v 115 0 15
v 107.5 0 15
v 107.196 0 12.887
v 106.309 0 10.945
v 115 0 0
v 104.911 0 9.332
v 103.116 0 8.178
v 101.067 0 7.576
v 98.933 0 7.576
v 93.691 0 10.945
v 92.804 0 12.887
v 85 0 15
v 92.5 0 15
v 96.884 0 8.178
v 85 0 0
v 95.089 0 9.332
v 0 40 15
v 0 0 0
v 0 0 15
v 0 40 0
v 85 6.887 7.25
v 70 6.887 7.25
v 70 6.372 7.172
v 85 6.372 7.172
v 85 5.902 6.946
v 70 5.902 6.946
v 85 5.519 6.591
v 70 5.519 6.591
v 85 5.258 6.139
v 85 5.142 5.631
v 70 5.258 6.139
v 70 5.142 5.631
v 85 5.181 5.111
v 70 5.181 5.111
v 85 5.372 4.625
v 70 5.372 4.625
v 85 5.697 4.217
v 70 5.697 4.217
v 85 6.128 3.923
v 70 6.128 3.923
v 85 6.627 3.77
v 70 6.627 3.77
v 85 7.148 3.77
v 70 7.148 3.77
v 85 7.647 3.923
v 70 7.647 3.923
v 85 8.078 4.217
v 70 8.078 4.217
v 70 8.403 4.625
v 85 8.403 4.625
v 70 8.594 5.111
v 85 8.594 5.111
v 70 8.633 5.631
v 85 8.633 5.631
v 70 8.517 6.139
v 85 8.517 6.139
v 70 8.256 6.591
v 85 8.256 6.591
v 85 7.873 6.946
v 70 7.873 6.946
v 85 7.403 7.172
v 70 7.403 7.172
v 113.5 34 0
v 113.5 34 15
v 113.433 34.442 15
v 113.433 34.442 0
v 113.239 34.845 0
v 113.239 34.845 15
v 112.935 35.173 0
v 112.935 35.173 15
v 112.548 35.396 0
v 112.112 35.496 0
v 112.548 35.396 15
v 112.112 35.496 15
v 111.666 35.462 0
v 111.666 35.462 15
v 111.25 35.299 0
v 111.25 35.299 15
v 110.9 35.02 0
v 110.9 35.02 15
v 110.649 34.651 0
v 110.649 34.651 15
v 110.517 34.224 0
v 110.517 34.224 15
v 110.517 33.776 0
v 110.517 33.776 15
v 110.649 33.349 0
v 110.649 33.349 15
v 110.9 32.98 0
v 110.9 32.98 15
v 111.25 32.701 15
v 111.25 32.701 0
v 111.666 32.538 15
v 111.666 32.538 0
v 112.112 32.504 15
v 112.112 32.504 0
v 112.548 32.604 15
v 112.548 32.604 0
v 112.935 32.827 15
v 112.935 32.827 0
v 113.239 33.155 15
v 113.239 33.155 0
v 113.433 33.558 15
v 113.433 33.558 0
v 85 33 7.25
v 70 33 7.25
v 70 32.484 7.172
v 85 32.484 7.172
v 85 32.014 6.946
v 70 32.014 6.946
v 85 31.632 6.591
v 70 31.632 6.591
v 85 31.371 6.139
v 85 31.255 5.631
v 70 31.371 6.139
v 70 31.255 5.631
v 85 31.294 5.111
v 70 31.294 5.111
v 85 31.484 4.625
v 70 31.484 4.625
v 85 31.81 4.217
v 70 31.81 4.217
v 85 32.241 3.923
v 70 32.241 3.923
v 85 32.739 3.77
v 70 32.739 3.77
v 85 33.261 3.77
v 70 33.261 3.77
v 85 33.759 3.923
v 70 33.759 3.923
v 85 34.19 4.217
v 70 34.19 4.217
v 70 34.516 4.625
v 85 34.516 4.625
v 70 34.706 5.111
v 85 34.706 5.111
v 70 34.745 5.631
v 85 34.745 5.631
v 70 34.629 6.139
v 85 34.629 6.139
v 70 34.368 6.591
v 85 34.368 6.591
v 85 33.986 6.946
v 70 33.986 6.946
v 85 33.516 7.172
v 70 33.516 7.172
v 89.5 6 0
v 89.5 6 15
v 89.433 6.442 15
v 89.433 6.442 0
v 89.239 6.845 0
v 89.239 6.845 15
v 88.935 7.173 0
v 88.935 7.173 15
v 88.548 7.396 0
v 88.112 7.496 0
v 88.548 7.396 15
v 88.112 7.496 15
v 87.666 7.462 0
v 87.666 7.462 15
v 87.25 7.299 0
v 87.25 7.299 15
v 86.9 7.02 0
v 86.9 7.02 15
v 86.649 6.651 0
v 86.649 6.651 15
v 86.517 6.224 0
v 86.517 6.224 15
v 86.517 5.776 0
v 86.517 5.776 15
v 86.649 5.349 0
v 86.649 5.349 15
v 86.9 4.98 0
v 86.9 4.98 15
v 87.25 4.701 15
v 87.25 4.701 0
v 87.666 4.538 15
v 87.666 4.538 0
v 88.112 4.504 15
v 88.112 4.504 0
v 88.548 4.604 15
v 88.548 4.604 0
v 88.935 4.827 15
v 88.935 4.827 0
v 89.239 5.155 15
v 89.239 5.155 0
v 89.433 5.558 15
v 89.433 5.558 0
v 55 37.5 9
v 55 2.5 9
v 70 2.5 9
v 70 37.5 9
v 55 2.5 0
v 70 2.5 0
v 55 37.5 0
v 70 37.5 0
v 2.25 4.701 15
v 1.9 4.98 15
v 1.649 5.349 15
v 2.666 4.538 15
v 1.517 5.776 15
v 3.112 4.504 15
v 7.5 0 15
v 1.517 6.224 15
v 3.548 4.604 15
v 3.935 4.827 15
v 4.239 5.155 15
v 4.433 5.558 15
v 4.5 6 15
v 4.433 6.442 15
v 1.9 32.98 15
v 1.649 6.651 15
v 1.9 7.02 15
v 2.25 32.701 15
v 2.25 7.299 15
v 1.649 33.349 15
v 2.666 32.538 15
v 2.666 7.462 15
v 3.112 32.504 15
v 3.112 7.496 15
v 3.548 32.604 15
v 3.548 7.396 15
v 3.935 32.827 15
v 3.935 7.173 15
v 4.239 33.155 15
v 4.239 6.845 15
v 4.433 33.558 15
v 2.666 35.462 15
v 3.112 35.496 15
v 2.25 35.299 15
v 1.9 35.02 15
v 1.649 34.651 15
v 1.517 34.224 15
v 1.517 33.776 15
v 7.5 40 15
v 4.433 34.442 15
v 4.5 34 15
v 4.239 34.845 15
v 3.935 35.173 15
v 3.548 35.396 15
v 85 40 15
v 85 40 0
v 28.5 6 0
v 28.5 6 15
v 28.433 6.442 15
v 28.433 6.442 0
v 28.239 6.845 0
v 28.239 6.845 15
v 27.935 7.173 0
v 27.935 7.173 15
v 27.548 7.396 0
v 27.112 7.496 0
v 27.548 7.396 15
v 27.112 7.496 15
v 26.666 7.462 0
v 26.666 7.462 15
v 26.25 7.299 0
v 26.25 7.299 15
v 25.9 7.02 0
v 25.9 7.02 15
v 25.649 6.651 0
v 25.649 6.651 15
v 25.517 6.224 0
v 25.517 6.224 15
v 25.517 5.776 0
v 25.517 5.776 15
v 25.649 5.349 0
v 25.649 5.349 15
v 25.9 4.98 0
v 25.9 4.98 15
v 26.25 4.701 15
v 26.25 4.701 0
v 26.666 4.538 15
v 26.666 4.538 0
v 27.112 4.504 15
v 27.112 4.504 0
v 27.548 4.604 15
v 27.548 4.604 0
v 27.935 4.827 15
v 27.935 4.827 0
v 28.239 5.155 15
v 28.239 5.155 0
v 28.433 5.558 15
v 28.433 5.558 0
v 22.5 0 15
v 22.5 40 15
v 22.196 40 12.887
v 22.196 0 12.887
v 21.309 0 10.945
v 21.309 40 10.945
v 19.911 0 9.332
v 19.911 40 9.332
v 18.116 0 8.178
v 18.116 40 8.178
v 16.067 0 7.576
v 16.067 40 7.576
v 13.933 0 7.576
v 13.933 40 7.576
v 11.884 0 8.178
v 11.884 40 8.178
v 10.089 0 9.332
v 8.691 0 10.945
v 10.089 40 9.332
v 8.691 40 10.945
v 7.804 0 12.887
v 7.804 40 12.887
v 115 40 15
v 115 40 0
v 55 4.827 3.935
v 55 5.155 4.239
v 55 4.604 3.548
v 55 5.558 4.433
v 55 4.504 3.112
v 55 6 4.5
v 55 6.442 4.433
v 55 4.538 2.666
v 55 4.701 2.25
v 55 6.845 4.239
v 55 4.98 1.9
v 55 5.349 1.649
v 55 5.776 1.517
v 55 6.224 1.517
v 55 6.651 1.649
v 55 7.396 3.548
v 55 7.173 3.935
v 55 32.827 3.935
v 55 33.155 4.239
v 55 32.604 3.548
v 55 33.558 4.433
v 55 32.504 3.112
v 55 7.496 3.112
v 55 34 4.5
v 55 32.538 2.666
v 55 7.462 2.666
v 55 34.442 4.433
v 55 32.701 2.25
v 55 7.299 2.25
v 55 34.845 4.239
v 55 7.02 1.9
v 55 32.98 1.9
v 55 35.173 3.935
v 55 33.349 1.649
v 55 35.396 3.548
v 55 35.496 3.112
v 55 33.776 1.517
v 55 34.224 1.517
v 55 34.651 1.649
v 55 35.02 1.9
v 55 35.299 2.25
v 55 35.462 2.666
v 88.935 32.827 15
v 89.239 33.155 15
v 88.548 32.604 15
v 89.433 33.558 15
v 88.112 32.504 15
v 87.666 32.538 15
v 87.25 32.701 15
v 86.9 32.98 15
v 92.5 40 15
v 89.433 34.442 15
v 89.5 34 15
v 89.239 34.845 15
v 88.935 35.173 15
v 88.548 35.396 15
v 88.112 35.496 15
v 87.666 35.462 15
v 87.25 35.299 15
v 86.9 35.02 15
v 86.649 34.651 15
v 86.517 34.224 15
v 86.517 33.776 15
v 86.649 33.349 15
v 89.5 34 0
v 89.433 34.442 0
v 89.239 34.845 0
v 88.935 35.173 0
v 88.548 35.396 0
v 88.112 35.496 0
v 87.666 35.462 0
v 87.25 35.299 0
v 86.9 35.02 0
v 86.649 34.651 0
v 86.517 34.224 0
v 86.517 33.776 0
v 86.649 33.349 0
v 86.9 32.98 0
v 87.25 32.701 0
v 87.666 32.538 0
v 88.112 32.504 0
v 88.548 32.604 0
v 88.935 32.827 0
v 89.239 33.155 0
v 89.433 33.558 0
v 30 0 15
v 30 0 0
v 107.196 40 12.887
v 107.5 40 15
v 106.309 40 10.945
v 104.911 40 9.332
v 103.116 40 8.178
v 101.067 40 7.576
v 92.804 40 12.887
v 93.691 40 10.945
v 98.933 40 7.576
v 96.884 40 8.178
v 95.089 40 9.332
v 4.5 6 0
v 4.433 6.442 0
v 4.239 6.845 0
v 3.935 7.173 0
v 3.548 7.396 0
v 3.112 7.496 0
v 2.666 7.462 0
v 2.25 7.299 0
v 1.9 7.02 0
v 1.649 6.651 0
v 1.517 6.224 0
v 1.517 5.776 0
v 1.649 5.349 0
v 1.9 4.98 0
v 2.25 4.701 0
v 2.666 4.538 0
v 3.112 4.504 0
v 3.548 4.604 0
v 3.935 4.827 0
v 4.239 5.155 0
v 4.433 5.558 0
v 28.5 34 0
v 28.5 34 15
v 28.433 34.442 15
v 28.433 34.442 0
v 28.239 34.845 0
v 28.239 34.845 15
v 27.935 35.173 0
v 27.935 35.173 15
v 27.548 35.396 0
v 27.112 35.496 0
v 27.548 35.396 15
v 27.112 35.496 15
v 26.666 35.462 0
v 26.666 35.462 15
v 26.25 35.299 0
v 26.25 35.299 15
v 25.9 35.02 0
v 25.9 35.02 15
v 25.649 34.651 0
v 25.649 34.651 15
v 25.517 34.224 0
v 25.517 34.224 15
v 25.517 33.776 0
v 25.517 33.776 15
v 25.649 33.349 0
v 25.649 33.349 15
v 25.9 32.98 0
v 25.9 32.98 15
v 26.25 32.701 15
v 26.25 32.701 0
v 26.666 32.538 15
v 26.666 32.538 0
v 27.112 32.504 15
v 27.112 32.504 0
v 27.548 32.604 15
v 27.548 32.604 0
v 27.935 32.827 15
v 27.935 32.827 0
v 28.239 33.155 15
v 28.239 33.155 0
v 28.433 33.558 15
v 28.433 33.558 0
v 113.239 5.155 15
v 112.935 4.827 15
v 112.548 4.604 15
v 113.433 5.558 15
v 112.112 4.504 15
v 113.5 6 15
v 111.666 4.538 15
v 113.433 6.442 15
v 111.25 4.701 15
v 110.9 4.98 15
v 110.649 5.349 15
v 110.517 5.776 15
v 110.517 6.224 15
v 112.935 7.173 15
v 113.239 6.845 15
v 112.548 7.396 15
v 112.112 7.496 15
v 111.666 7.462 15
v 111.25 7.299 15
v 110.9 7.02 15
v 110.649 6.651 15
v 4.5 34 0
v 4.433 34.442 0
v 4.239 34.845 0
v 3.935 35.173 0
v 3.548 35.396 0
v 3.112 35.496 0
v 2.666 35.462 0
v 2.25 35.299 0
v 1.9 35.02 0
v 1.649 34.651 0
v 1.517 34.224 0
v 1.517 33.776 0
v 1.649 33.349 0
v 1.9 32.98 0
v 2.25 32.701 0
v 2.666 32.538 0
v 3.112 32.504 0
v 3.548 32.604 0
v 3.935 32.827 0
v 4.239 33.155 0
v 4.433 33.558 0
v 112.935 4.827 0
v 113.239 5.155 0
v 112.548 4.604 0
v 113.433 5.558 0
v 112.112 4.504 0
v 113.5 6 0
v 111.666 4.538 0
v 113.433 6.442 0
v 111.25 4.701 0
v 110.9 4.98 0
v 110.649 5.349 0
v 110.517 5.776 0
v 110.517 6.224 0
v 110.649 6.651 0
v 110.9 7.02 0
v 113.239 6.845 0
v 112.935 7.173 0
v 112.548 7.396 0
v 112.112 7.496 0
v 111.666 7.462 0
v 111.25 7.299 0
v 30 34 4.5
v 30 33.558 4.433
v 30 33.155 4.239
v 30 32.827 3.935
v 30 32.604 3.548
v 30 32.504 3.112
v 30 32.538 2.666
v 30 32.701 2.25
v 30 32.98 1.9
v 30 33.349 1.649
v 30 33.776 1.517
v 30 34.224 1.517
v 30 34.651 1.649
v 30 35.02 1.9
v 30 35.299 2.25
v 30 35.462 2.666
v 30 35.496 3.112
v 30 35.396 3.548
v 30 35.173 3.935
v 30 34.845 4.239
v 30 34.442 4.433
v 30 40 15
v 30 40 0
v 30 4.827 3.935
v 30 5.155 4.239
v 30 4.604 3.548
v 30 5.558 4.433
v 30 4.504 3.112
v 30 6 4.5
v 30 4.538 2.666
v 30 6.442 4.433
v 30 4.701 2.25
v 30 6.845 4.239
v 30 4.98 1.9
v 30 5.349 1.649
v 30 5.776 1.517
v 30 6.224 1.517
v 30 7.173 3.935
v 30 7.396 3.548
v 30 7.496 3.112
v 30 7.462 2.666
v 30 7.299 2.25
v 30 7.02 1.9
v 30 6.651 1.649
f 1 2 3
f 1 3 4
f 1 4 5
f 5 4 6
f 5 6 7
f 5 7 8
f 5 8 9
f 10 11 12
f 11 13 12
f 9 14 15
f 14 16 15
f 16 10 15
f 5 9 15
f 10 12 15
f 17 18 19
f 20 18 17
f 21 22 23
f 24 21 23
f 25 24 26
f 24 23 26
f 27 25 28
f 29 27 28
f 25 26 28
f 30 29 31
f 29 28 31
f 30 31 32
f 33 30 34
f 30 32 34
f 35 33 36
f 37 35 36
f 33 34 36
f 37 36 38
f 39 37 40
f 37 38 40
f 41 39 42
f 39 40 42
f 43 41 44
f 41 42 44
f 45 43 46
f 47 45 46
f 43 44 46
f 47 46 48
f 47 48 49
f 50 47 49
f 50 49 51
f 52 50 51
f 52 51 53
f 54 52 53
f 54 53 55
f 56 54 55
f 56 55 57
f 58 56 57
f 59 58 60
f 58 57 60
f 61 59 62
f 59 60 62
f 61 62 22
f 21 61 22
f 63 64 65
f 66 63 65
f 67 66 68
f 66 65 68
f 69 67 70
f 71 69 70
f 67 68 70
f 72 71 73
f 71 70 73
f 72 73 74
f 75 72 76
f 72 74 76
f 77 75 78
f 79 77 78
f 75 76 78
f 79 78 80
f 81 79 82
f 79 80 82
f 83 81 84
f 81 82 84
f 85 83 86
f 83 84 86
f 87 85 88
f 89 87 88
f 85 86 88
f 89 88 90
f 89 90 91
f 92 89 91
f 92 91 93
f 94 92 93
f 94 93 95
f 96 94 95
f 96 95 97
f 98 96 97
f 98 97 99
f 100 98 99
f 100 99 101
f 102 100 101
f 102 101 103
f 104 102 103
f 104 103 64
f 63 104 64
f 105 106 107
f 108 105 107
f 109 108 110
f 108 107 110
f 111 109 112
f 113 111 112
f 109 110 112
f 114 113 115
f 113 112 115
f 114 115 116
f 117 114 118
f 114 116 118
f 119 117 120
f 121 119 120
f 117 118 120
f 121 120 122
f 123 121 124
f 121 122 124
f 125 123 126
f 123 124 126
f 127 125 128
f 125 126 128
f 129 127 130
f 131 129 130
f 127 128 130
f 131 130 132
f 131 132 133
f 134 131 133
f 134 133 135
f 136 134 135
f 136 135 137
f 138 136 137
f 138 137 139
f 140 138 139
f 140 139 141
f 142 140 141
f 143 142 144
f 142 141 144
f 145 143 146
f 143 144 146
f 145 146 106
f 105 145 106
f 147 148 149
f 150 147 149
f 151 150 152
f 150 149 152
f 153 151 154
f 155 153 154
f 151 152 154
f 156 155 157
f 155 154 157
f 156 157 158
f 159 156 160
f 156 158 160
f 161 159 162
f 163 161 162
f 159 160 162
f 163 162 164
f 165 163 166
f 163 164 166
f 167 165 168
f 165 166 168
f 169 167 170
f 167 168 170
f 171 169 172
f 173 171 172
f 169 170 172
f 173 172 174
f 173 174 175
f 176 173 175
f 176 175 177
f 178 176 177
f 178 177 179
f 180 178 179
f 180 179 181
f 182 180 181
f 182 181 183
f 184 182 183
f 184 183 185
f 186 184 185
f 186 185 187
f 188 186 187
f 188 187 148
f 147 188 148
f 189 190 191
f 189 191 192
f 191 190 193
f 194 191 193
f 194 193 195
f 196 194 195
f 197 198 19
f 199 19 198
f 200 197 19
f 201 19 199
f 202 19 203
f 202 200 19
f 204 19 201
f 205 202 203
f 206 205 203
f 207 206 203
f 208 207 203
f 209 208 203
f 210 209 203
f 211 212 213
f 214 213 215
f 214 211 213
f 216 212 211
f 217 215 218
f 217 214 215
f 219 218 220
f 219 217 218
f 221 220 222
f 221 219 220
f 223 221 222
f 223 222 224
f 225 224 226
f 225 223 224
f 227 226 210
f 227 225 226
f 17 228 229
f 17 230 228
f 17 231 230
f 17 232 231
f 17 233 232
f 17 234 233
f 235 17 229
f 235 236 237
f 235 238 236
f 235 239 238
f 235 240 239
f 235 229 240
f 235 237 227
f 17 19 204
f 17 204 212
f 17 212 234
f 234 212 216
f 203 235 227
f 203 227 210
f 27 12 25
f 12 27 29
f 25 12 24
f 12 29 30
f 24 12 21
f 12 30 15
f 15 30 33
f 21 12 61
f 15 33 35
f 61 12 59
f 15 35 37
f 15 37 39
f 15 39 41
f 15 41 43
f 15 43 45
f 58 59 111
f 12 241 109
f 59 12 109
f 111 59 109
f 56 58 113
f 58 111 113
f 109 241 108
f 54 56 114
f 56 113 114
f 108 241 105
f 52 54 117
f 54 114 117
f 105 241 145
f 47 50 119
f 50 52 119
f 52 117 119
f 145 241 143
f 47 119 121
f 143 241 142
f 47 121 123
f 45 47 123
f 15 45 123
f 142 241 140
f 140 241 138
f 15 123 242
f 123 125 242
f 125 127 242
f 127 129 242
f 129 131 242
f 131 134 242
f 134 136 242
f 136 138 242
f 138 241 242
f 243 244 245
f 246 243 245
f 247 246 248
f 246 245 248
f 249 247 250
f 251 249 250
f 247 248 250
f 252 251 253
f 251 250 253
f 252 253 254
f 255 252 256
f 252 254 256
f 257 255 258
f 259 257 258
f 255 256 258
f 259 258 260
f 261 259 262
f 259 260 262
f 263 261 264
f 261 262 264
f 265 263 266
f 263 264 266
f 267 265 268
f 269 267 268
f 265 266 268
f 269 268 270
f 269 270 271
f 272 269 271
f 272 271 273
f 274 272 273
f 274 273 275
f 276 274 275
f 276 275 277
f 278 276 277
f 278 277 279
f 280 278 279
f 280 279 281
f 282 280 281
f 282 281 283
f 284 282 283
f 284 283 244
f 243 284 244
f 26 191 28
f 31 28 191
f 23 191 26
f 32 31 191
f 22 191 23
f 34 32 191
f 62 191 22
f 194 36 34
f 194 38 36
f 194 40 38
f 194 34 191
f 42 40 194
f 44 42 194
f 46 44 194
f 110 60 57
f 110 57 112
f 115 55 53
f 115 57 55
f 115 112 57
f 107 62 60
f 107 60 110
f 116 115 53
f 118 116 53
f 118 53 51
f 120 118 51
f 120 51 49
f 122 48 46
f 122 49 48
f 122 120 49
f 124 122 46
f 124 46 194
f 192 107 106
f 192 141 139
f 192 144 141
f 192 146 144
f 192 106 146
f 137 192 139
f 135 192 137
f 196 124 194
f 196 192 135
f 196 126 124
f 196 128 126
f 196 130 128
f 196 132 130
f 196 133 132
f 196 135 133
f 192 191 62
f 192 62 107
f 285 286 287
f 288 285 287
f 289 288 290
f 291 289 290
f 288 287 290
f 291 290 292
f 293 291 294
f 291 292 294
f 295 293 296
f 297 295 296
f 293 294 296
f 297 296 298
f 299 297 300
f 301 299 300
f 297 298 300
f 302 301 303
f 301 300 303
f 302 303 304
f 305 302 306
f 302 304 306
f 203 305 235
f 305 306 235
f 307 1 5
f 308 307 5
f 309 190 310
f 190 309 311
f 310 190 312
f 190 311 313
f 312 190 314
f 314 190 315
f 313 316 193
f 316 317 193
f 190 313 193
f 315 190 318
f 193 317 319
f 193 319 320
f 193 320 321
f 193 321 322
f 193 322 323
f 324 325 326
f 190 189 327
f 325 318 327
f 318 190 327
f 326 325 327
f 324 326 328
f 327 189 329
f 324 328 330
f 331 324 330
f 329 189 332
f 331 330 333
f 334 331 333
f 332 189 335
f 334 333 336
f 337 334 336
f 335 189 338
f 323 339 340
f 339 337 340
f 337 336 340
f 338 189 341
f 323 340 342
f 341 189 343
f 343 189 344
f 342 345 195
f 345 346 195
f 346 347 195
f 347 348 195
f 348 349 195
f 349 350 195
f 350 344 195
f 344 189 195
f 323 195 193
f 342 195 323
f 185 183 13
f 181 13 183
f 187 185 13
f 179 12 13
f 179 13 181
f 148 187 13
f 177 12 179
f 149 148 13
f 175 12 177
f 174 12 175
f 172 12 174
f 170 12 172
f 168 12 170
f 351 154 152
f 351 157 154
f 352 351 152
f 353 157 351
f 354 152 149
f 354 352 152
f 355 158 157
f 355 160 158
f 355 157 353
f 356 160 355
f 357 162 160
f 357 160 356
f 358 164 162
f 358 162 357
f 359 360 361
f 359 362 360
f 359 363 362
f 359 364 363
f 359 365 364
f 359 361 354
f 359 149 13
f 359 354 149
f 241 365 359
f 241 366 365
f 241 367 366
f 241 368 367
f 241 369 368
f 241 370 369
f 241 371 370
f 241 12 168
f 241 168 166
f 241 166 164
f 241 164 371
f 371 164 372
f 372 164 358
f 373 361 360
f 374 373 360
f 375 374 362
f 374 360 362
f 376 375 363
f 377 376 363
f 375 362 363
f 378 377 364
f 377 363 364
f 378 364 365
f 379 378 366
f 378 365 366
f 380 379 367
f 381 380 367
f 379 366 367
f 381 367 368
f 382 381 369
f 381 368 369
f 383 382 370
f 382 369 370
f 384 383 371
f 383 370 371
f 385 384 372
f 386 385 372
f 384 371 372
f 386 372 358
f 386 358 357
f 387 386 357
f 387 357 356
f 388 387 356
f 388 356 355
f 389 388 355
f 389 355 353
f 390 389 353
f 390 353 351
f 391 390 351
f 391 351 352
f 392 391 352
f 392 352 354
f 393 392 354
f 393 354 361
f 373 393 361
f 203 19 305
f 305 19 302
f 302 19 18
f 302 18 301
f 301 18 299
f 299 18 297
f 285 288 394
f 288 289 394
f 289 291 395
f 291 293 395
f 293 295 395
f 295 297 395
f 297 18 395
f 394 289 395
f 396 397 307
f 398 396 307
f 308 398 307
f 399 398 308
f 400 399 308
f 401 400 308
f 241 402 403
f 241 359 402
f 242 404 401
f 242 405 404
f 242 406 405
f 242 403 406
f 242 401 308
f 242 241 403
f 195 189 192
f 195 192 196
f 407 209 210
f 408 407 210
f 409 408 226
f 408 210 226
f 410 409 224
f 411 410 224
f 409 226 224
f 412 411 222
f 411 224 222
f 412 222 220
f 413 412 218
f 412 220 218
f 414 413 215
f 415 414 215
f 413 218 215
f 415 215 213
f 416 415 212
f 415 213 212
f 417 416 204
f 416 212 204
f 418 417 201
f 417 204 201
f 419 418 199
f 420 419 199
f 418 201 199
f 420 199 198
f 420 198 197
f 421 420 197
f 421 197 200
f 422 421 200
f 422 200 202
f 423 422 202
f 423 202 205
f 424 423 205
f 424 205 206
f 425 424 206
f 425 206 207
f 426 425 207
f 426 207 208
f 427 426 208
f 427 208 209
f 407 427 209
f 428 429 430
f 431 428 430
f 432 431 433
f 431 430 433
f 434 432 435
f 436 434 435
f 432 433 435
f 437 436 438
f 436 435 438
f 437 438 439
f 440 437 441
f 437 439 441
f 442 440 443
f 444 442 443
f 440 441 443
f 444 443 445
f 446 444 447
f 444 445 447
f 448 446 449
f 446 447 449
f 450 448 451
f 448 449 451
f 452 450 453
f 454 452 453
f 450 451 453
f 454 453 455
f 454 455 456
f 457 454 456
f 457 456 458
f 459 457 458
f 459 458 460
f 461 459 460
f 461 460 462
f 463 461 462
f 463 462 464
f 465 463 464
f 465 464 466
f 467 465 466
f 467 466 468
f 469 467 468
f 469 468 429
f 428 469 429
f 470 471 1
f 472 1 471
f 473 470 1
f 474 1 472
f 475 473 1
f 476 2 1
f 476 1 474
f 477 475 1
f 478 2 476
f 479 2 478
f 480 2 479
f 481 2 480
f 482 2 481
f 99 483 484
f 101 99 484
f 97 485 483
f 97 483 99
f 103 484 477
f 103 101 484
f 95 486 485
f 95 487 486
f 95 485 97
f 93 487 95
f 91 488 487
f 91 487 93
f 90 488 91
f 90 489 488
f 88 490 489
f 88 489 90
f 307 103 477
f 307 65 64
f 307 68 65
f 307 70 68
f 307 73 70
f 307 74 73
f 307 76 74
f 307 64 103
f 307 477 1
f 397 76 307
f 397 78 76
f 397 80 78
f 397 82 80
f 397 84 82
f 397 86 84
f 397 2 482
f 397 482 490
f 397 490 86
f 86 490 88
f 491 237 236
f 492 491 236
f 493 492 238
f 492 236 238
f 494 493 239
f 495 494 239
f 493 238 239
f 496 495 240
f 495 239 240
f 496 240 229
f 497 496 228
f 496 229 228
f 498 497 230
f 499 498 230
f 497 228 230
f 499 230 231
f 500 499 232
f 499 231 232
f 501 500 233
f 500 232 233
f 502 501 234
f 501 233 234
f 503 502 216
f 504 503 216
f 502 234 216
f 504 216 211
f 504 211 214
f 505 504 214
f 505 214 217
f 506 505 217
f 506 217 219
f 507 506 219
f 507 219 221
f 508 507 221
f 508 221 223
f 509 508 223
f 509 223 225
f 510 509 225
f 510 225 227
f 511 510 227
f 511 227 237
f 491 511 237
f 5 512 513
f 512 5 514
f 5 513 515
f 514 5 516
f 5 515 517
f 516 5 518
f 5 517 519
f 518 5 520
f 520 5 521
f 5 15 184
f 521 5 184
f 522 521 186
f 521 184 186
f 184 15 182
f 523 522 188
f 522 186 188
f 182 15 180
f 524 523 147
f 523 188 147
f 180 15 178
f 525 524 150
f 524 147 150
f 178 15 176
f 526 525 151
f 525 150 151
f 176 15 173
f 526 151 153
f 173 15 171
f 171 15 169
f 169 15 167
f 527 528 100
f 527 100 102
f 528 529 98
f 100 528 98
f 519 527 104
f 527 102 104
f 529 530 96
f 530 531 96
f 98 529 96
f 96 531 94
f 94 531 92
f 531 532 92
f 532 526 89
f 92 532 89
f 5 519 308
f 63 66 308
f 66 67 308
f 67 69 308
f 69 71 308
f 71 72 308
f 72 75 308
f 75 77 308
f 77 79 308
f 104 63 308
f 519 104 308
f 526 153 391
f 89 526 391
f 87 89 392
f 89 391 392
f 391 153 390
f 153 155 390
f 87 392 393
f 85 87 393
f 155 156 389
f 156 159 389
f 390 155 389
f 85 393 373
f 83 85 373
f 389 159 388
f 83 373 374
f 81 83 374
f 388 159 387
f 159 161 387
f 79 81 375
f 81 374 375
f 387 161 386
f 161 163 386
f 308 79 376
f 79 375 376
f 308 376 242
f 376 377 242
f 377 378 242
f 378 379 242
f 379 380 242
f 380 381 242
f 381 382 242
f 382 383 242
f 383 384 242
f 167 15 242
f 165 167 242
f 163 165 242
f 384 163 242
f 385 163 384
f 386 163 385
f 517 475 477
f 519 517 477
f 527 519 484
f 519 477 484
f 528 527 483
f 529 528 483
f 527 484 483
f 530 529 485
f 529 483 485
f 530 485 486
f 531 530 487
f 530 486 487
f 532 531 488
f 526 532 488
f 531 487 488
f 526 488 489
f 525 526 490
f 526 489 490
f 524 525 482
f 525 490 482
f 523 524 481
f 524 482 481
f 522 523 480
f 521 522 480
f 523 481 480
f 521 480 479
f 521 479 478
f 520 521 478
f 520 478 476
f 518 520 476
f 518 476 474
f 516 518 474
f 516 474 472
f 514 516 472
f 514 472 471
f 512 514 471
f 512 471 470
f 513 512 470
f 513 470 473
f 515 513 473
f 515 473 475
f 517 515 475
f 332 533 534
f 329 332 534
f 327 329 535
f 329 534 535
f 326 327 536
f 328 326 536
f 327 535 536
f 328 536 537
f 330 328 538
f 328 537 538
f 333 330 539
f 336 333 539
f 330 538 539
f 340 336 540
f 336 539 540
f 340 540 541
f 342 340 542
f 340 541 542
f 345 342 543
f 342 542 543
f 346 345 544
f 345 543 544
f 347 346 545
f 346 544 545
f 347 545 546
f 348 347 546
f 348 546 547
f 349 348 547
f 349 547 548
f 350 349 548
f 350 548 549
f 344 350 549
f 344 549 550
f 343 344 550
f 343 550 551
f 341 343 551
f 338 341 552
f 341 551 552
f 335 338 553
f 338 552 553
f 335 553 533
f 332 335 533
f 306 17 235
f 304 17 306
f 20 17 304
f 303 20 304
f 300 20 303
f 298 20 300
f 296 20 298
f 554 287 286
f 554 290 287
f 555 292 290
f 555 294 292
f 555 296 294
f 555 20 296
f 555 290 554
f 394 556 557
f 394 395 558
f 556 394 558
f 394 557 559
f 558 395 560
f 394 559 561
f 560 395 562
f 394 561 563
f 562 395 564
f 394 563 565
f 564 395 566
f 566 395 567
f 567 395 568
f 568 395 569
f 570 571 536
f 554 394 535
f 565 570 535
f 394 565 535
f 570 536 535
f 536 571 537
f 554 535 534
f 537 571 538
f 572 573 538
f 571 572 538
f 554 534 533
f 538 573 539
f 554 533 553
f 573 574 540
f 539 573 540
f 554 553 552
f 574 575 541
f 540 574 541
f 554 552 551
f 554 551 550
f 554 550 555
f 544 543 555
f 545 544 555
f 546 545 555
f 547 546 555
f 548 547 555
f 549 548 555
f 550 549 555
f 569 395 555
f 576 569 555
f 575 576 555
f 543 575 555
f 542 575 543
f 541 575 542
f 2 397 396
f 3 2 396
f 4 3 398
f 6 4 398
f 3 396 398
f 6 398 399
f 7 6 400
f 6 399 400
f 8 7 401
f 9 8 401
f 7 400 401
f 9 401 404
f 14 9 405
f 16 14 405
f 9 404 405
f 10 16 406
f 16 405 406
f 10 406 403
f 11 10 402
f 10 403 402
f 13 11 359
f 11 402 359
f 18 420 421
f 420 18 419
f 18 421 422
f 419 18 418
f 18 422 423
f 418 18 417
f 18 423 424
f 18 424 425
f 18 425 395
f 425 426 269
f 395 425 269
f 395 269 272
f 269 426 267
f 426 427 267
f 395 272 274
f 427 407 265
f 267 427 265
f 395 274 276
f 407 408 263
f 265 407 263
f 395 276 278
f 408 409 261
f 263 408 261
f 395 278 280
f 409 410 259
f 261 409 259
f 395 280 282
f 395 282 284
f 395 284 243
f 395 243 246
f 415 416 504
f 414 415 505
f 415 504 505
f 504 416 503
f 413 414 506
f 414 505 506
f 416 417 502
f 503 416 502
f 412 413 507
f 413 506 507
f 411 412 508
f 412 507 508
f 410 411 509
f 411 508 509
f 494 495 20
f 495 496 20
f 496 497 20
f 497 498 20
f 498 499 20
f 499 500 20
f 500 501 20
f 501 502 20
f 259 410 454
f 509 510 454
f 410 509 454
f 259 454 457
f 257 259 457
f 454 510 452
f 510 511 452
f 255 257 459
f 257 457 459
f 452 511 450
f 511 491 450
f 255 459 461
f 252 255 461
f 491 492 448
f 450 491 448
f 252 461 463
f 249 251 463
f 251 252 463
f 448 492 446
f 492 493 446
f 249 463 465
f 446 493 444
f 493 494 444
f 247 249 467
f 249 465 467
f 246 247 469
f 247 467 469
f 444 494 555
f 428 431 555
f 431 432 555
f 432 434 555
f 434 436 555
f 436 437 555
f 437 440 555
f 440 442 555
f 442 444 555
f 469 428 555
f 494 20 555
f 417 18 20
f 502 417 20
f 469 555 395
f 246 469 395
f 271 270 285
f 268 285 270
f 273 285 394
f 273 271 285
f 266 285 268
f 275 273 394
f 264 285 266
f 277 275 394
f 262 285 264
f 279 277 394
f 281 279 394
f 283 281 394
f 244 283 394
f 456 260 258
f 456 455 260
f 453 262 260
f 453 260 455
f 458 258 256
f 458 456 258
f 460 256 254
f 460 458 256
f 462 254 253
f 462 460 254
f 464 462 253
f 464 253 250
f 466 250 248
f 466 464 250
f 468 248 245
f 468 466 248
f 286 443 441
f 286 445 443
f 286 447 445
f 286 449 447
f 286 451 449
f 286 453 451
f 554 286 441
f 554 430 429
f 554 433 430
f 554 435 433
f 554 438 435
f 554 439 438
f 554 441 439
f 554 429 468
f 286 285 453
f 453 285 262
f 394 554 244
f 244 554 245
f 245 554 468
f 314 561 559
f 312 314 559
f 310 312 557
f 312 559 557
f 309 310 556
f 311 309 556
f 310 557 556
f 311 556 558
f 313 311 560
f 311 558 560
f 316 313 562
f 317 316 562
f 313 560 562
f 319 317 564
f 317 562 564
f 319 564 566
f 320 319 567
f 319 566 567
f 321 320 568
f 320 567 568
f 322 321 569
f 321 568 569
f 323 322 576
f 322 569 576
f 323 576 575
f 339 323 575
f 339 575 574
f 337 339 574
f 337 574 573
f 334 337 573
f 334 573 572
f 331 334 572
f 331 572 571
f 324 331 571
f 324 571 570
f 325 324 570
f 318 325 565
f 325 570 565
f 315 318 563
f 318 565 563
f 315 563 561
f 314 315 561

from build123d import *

# Parameters (mm, degrees)
SKETCH1_W           = 30
SKETCH1_H           = 40
BOSS_EXTRUDE1_DEPTH = 15
CUT_EXTRUDE1_DEPTH  = 49
SKETCH3_R           = 1.5
CUT_EXTRUDE2_DEPTH  = 49
SKETCH4_R           = 1.5
BOSS_EXTRUDE2_DEPTH = 25
SKETCH5_W           = 9
SKETCH5_H           = 35
BOSS_EXTRUDE3_DEPTH = 15
SKETCH6_R           = 1.75
BOSS_EXTRUDE4_DEPTH = 15
SKETCH7_W           = 15
SKETCH7_H           = 40
BOSS_EXTRUDE6_DEPTH = 30
CUT_EXTRUDE3_DEPTH  = 59
SKETCH10_R          = 1.5
CUT_EXTRUDE4_DEPTH  = 59


with BuildPart() as part:
    # Sketch1 → Boss-Extrude1 (new body)
    with BuildSketch(Plane.XY):
        with Locations((15, 20)):
            Rectangle(SKETCH1_W, SKETCH1_H)
    extrude(amount=BOSS_EXTRUDE1_DEPTH)

    # Sketch2 → Cut-Extrude1 (cut)
    with BuildSketch(Plane(origin=(0, 40, 0), x_dir=(1, 0, 0), z_dir=(0, 1, 0))):
        with BuildLine():
            Line((7.5, -15), (22.5, -15))
            ThreePointArc((22.5, -15), (15, -7.5), (7.5, -15))
        make_face()
    extrude(amount=-CUT_EXTRUDE1_DEPTH, mode=Mode.SUBTRACT)

    # Sketch3 → Cut-Extrude2 (cut)
    with BuildSketch(Plane.XY.offset(15)):
        with Locations((3, 34)):
            Circle(SKETCH3_R)
        with Locations((3, 6)):
            Circle(SKETCH3_R)
        with Locations((27, 34)):
            Circle(SKETCH3_R)
        with Locations((27, 6)):
            Circle(SKETCH3_R)
    extrude(amount=-CUT_EXTRUDE2_DEPTH, mode=Mode.SUBTRACT)

    # Sketch4 → Boss-Extrude2 (add)
    with BuildSketch(Plane(origin=(30, 0, 0), x_dir=(0, 0, -1), z_dir=(1, 0, 0))):
        with Locations(Location((-3, 34, 0), (0, 0, 180))):
            Circle(SKETCH4_R)
        with Locations(Location((-3, 6, 0), (0, 0, 180))):
            Circle(SKETCH4_R)
    extrude(amount=BOSS_EXTRUDE2_DEPTH)

    # Sketch5 → Boss-Extrude3 (add)
    with BuildSketch(Plane(origin=(55, 0, 0), x_dir=(0, 0, -1), z_dir=(1, 0, 0))):
        with Locations((-4.5, 20)):
            Rectangle(SKETCH5_W, SKETCH5_H)
    extrude(amount=BOSS_EXTRUDE3_DEPTH)

    # Sketch6 → Boss-Extrude4 (add)
    with BuildSketch(Plane(origin=(70, 0, 0), x_dir=(0, 0, -1), z_dir=(1, 0, 0))):
        with Locations(Location((-5.5, 33, 0), (0, 0, 180))):
            Circle(SKETCH6_R)
        with Locations(Location((-5.5, 6.887482194, 0), (0, 0, 180))):
            Circle(SKETCH6_R)
    extrude(amount=BOSS_EXTRUDE4_DEPTH)

    # Sketch7 → Boss-Extrude6 (add)
    with BuildSketch(Plane(origin=(85, 0, 0), x_dir=(0, 0, -1), z_dir=(1, 0, 0))):
        with Locations((-7.5, 20)):
            Rectangle(SKETCH7_W, SKETCH7_H)
    extrude(amount=BOSS_EXTRUDE6_DEPTH)

    # Sketch9 → Cut-Extrude3 (cut)
    with BuildSketch(Plane(origin=(0, 40, 0), x_dir=(1, 0, 0), z_dir=(0, 1, 0))):
        with BuildLine():
            Line((92.5, -15), (107.5, -15))
            ThreePointArc((107.5, -15), (100, -7.5), (92.5, -15))
        make_face()
    extrude(amount=-CUT_EXTRUDE3_DEPTH, mode=Mode.SUBTRACT)

    # Sketch10 → Cut-Extrude4 (cut)
    with BuildSketch(Plane.XY.offset(15)):
        with Locations((88, 34)):
            Circle(SKETCH10_R)
        with Locations((112, 34)):
            Circle(SKETCH10_R)
        with Locations((112, 6)):
            Circle(SKETCH10_R)
        with Locations((88, 6)):
            Circle(SKETCH10_R)
    extrude(amount=-CUT_EXTRUDE4_DEPTH, mode=Mode.SUBTRACT)


solid = part.part
